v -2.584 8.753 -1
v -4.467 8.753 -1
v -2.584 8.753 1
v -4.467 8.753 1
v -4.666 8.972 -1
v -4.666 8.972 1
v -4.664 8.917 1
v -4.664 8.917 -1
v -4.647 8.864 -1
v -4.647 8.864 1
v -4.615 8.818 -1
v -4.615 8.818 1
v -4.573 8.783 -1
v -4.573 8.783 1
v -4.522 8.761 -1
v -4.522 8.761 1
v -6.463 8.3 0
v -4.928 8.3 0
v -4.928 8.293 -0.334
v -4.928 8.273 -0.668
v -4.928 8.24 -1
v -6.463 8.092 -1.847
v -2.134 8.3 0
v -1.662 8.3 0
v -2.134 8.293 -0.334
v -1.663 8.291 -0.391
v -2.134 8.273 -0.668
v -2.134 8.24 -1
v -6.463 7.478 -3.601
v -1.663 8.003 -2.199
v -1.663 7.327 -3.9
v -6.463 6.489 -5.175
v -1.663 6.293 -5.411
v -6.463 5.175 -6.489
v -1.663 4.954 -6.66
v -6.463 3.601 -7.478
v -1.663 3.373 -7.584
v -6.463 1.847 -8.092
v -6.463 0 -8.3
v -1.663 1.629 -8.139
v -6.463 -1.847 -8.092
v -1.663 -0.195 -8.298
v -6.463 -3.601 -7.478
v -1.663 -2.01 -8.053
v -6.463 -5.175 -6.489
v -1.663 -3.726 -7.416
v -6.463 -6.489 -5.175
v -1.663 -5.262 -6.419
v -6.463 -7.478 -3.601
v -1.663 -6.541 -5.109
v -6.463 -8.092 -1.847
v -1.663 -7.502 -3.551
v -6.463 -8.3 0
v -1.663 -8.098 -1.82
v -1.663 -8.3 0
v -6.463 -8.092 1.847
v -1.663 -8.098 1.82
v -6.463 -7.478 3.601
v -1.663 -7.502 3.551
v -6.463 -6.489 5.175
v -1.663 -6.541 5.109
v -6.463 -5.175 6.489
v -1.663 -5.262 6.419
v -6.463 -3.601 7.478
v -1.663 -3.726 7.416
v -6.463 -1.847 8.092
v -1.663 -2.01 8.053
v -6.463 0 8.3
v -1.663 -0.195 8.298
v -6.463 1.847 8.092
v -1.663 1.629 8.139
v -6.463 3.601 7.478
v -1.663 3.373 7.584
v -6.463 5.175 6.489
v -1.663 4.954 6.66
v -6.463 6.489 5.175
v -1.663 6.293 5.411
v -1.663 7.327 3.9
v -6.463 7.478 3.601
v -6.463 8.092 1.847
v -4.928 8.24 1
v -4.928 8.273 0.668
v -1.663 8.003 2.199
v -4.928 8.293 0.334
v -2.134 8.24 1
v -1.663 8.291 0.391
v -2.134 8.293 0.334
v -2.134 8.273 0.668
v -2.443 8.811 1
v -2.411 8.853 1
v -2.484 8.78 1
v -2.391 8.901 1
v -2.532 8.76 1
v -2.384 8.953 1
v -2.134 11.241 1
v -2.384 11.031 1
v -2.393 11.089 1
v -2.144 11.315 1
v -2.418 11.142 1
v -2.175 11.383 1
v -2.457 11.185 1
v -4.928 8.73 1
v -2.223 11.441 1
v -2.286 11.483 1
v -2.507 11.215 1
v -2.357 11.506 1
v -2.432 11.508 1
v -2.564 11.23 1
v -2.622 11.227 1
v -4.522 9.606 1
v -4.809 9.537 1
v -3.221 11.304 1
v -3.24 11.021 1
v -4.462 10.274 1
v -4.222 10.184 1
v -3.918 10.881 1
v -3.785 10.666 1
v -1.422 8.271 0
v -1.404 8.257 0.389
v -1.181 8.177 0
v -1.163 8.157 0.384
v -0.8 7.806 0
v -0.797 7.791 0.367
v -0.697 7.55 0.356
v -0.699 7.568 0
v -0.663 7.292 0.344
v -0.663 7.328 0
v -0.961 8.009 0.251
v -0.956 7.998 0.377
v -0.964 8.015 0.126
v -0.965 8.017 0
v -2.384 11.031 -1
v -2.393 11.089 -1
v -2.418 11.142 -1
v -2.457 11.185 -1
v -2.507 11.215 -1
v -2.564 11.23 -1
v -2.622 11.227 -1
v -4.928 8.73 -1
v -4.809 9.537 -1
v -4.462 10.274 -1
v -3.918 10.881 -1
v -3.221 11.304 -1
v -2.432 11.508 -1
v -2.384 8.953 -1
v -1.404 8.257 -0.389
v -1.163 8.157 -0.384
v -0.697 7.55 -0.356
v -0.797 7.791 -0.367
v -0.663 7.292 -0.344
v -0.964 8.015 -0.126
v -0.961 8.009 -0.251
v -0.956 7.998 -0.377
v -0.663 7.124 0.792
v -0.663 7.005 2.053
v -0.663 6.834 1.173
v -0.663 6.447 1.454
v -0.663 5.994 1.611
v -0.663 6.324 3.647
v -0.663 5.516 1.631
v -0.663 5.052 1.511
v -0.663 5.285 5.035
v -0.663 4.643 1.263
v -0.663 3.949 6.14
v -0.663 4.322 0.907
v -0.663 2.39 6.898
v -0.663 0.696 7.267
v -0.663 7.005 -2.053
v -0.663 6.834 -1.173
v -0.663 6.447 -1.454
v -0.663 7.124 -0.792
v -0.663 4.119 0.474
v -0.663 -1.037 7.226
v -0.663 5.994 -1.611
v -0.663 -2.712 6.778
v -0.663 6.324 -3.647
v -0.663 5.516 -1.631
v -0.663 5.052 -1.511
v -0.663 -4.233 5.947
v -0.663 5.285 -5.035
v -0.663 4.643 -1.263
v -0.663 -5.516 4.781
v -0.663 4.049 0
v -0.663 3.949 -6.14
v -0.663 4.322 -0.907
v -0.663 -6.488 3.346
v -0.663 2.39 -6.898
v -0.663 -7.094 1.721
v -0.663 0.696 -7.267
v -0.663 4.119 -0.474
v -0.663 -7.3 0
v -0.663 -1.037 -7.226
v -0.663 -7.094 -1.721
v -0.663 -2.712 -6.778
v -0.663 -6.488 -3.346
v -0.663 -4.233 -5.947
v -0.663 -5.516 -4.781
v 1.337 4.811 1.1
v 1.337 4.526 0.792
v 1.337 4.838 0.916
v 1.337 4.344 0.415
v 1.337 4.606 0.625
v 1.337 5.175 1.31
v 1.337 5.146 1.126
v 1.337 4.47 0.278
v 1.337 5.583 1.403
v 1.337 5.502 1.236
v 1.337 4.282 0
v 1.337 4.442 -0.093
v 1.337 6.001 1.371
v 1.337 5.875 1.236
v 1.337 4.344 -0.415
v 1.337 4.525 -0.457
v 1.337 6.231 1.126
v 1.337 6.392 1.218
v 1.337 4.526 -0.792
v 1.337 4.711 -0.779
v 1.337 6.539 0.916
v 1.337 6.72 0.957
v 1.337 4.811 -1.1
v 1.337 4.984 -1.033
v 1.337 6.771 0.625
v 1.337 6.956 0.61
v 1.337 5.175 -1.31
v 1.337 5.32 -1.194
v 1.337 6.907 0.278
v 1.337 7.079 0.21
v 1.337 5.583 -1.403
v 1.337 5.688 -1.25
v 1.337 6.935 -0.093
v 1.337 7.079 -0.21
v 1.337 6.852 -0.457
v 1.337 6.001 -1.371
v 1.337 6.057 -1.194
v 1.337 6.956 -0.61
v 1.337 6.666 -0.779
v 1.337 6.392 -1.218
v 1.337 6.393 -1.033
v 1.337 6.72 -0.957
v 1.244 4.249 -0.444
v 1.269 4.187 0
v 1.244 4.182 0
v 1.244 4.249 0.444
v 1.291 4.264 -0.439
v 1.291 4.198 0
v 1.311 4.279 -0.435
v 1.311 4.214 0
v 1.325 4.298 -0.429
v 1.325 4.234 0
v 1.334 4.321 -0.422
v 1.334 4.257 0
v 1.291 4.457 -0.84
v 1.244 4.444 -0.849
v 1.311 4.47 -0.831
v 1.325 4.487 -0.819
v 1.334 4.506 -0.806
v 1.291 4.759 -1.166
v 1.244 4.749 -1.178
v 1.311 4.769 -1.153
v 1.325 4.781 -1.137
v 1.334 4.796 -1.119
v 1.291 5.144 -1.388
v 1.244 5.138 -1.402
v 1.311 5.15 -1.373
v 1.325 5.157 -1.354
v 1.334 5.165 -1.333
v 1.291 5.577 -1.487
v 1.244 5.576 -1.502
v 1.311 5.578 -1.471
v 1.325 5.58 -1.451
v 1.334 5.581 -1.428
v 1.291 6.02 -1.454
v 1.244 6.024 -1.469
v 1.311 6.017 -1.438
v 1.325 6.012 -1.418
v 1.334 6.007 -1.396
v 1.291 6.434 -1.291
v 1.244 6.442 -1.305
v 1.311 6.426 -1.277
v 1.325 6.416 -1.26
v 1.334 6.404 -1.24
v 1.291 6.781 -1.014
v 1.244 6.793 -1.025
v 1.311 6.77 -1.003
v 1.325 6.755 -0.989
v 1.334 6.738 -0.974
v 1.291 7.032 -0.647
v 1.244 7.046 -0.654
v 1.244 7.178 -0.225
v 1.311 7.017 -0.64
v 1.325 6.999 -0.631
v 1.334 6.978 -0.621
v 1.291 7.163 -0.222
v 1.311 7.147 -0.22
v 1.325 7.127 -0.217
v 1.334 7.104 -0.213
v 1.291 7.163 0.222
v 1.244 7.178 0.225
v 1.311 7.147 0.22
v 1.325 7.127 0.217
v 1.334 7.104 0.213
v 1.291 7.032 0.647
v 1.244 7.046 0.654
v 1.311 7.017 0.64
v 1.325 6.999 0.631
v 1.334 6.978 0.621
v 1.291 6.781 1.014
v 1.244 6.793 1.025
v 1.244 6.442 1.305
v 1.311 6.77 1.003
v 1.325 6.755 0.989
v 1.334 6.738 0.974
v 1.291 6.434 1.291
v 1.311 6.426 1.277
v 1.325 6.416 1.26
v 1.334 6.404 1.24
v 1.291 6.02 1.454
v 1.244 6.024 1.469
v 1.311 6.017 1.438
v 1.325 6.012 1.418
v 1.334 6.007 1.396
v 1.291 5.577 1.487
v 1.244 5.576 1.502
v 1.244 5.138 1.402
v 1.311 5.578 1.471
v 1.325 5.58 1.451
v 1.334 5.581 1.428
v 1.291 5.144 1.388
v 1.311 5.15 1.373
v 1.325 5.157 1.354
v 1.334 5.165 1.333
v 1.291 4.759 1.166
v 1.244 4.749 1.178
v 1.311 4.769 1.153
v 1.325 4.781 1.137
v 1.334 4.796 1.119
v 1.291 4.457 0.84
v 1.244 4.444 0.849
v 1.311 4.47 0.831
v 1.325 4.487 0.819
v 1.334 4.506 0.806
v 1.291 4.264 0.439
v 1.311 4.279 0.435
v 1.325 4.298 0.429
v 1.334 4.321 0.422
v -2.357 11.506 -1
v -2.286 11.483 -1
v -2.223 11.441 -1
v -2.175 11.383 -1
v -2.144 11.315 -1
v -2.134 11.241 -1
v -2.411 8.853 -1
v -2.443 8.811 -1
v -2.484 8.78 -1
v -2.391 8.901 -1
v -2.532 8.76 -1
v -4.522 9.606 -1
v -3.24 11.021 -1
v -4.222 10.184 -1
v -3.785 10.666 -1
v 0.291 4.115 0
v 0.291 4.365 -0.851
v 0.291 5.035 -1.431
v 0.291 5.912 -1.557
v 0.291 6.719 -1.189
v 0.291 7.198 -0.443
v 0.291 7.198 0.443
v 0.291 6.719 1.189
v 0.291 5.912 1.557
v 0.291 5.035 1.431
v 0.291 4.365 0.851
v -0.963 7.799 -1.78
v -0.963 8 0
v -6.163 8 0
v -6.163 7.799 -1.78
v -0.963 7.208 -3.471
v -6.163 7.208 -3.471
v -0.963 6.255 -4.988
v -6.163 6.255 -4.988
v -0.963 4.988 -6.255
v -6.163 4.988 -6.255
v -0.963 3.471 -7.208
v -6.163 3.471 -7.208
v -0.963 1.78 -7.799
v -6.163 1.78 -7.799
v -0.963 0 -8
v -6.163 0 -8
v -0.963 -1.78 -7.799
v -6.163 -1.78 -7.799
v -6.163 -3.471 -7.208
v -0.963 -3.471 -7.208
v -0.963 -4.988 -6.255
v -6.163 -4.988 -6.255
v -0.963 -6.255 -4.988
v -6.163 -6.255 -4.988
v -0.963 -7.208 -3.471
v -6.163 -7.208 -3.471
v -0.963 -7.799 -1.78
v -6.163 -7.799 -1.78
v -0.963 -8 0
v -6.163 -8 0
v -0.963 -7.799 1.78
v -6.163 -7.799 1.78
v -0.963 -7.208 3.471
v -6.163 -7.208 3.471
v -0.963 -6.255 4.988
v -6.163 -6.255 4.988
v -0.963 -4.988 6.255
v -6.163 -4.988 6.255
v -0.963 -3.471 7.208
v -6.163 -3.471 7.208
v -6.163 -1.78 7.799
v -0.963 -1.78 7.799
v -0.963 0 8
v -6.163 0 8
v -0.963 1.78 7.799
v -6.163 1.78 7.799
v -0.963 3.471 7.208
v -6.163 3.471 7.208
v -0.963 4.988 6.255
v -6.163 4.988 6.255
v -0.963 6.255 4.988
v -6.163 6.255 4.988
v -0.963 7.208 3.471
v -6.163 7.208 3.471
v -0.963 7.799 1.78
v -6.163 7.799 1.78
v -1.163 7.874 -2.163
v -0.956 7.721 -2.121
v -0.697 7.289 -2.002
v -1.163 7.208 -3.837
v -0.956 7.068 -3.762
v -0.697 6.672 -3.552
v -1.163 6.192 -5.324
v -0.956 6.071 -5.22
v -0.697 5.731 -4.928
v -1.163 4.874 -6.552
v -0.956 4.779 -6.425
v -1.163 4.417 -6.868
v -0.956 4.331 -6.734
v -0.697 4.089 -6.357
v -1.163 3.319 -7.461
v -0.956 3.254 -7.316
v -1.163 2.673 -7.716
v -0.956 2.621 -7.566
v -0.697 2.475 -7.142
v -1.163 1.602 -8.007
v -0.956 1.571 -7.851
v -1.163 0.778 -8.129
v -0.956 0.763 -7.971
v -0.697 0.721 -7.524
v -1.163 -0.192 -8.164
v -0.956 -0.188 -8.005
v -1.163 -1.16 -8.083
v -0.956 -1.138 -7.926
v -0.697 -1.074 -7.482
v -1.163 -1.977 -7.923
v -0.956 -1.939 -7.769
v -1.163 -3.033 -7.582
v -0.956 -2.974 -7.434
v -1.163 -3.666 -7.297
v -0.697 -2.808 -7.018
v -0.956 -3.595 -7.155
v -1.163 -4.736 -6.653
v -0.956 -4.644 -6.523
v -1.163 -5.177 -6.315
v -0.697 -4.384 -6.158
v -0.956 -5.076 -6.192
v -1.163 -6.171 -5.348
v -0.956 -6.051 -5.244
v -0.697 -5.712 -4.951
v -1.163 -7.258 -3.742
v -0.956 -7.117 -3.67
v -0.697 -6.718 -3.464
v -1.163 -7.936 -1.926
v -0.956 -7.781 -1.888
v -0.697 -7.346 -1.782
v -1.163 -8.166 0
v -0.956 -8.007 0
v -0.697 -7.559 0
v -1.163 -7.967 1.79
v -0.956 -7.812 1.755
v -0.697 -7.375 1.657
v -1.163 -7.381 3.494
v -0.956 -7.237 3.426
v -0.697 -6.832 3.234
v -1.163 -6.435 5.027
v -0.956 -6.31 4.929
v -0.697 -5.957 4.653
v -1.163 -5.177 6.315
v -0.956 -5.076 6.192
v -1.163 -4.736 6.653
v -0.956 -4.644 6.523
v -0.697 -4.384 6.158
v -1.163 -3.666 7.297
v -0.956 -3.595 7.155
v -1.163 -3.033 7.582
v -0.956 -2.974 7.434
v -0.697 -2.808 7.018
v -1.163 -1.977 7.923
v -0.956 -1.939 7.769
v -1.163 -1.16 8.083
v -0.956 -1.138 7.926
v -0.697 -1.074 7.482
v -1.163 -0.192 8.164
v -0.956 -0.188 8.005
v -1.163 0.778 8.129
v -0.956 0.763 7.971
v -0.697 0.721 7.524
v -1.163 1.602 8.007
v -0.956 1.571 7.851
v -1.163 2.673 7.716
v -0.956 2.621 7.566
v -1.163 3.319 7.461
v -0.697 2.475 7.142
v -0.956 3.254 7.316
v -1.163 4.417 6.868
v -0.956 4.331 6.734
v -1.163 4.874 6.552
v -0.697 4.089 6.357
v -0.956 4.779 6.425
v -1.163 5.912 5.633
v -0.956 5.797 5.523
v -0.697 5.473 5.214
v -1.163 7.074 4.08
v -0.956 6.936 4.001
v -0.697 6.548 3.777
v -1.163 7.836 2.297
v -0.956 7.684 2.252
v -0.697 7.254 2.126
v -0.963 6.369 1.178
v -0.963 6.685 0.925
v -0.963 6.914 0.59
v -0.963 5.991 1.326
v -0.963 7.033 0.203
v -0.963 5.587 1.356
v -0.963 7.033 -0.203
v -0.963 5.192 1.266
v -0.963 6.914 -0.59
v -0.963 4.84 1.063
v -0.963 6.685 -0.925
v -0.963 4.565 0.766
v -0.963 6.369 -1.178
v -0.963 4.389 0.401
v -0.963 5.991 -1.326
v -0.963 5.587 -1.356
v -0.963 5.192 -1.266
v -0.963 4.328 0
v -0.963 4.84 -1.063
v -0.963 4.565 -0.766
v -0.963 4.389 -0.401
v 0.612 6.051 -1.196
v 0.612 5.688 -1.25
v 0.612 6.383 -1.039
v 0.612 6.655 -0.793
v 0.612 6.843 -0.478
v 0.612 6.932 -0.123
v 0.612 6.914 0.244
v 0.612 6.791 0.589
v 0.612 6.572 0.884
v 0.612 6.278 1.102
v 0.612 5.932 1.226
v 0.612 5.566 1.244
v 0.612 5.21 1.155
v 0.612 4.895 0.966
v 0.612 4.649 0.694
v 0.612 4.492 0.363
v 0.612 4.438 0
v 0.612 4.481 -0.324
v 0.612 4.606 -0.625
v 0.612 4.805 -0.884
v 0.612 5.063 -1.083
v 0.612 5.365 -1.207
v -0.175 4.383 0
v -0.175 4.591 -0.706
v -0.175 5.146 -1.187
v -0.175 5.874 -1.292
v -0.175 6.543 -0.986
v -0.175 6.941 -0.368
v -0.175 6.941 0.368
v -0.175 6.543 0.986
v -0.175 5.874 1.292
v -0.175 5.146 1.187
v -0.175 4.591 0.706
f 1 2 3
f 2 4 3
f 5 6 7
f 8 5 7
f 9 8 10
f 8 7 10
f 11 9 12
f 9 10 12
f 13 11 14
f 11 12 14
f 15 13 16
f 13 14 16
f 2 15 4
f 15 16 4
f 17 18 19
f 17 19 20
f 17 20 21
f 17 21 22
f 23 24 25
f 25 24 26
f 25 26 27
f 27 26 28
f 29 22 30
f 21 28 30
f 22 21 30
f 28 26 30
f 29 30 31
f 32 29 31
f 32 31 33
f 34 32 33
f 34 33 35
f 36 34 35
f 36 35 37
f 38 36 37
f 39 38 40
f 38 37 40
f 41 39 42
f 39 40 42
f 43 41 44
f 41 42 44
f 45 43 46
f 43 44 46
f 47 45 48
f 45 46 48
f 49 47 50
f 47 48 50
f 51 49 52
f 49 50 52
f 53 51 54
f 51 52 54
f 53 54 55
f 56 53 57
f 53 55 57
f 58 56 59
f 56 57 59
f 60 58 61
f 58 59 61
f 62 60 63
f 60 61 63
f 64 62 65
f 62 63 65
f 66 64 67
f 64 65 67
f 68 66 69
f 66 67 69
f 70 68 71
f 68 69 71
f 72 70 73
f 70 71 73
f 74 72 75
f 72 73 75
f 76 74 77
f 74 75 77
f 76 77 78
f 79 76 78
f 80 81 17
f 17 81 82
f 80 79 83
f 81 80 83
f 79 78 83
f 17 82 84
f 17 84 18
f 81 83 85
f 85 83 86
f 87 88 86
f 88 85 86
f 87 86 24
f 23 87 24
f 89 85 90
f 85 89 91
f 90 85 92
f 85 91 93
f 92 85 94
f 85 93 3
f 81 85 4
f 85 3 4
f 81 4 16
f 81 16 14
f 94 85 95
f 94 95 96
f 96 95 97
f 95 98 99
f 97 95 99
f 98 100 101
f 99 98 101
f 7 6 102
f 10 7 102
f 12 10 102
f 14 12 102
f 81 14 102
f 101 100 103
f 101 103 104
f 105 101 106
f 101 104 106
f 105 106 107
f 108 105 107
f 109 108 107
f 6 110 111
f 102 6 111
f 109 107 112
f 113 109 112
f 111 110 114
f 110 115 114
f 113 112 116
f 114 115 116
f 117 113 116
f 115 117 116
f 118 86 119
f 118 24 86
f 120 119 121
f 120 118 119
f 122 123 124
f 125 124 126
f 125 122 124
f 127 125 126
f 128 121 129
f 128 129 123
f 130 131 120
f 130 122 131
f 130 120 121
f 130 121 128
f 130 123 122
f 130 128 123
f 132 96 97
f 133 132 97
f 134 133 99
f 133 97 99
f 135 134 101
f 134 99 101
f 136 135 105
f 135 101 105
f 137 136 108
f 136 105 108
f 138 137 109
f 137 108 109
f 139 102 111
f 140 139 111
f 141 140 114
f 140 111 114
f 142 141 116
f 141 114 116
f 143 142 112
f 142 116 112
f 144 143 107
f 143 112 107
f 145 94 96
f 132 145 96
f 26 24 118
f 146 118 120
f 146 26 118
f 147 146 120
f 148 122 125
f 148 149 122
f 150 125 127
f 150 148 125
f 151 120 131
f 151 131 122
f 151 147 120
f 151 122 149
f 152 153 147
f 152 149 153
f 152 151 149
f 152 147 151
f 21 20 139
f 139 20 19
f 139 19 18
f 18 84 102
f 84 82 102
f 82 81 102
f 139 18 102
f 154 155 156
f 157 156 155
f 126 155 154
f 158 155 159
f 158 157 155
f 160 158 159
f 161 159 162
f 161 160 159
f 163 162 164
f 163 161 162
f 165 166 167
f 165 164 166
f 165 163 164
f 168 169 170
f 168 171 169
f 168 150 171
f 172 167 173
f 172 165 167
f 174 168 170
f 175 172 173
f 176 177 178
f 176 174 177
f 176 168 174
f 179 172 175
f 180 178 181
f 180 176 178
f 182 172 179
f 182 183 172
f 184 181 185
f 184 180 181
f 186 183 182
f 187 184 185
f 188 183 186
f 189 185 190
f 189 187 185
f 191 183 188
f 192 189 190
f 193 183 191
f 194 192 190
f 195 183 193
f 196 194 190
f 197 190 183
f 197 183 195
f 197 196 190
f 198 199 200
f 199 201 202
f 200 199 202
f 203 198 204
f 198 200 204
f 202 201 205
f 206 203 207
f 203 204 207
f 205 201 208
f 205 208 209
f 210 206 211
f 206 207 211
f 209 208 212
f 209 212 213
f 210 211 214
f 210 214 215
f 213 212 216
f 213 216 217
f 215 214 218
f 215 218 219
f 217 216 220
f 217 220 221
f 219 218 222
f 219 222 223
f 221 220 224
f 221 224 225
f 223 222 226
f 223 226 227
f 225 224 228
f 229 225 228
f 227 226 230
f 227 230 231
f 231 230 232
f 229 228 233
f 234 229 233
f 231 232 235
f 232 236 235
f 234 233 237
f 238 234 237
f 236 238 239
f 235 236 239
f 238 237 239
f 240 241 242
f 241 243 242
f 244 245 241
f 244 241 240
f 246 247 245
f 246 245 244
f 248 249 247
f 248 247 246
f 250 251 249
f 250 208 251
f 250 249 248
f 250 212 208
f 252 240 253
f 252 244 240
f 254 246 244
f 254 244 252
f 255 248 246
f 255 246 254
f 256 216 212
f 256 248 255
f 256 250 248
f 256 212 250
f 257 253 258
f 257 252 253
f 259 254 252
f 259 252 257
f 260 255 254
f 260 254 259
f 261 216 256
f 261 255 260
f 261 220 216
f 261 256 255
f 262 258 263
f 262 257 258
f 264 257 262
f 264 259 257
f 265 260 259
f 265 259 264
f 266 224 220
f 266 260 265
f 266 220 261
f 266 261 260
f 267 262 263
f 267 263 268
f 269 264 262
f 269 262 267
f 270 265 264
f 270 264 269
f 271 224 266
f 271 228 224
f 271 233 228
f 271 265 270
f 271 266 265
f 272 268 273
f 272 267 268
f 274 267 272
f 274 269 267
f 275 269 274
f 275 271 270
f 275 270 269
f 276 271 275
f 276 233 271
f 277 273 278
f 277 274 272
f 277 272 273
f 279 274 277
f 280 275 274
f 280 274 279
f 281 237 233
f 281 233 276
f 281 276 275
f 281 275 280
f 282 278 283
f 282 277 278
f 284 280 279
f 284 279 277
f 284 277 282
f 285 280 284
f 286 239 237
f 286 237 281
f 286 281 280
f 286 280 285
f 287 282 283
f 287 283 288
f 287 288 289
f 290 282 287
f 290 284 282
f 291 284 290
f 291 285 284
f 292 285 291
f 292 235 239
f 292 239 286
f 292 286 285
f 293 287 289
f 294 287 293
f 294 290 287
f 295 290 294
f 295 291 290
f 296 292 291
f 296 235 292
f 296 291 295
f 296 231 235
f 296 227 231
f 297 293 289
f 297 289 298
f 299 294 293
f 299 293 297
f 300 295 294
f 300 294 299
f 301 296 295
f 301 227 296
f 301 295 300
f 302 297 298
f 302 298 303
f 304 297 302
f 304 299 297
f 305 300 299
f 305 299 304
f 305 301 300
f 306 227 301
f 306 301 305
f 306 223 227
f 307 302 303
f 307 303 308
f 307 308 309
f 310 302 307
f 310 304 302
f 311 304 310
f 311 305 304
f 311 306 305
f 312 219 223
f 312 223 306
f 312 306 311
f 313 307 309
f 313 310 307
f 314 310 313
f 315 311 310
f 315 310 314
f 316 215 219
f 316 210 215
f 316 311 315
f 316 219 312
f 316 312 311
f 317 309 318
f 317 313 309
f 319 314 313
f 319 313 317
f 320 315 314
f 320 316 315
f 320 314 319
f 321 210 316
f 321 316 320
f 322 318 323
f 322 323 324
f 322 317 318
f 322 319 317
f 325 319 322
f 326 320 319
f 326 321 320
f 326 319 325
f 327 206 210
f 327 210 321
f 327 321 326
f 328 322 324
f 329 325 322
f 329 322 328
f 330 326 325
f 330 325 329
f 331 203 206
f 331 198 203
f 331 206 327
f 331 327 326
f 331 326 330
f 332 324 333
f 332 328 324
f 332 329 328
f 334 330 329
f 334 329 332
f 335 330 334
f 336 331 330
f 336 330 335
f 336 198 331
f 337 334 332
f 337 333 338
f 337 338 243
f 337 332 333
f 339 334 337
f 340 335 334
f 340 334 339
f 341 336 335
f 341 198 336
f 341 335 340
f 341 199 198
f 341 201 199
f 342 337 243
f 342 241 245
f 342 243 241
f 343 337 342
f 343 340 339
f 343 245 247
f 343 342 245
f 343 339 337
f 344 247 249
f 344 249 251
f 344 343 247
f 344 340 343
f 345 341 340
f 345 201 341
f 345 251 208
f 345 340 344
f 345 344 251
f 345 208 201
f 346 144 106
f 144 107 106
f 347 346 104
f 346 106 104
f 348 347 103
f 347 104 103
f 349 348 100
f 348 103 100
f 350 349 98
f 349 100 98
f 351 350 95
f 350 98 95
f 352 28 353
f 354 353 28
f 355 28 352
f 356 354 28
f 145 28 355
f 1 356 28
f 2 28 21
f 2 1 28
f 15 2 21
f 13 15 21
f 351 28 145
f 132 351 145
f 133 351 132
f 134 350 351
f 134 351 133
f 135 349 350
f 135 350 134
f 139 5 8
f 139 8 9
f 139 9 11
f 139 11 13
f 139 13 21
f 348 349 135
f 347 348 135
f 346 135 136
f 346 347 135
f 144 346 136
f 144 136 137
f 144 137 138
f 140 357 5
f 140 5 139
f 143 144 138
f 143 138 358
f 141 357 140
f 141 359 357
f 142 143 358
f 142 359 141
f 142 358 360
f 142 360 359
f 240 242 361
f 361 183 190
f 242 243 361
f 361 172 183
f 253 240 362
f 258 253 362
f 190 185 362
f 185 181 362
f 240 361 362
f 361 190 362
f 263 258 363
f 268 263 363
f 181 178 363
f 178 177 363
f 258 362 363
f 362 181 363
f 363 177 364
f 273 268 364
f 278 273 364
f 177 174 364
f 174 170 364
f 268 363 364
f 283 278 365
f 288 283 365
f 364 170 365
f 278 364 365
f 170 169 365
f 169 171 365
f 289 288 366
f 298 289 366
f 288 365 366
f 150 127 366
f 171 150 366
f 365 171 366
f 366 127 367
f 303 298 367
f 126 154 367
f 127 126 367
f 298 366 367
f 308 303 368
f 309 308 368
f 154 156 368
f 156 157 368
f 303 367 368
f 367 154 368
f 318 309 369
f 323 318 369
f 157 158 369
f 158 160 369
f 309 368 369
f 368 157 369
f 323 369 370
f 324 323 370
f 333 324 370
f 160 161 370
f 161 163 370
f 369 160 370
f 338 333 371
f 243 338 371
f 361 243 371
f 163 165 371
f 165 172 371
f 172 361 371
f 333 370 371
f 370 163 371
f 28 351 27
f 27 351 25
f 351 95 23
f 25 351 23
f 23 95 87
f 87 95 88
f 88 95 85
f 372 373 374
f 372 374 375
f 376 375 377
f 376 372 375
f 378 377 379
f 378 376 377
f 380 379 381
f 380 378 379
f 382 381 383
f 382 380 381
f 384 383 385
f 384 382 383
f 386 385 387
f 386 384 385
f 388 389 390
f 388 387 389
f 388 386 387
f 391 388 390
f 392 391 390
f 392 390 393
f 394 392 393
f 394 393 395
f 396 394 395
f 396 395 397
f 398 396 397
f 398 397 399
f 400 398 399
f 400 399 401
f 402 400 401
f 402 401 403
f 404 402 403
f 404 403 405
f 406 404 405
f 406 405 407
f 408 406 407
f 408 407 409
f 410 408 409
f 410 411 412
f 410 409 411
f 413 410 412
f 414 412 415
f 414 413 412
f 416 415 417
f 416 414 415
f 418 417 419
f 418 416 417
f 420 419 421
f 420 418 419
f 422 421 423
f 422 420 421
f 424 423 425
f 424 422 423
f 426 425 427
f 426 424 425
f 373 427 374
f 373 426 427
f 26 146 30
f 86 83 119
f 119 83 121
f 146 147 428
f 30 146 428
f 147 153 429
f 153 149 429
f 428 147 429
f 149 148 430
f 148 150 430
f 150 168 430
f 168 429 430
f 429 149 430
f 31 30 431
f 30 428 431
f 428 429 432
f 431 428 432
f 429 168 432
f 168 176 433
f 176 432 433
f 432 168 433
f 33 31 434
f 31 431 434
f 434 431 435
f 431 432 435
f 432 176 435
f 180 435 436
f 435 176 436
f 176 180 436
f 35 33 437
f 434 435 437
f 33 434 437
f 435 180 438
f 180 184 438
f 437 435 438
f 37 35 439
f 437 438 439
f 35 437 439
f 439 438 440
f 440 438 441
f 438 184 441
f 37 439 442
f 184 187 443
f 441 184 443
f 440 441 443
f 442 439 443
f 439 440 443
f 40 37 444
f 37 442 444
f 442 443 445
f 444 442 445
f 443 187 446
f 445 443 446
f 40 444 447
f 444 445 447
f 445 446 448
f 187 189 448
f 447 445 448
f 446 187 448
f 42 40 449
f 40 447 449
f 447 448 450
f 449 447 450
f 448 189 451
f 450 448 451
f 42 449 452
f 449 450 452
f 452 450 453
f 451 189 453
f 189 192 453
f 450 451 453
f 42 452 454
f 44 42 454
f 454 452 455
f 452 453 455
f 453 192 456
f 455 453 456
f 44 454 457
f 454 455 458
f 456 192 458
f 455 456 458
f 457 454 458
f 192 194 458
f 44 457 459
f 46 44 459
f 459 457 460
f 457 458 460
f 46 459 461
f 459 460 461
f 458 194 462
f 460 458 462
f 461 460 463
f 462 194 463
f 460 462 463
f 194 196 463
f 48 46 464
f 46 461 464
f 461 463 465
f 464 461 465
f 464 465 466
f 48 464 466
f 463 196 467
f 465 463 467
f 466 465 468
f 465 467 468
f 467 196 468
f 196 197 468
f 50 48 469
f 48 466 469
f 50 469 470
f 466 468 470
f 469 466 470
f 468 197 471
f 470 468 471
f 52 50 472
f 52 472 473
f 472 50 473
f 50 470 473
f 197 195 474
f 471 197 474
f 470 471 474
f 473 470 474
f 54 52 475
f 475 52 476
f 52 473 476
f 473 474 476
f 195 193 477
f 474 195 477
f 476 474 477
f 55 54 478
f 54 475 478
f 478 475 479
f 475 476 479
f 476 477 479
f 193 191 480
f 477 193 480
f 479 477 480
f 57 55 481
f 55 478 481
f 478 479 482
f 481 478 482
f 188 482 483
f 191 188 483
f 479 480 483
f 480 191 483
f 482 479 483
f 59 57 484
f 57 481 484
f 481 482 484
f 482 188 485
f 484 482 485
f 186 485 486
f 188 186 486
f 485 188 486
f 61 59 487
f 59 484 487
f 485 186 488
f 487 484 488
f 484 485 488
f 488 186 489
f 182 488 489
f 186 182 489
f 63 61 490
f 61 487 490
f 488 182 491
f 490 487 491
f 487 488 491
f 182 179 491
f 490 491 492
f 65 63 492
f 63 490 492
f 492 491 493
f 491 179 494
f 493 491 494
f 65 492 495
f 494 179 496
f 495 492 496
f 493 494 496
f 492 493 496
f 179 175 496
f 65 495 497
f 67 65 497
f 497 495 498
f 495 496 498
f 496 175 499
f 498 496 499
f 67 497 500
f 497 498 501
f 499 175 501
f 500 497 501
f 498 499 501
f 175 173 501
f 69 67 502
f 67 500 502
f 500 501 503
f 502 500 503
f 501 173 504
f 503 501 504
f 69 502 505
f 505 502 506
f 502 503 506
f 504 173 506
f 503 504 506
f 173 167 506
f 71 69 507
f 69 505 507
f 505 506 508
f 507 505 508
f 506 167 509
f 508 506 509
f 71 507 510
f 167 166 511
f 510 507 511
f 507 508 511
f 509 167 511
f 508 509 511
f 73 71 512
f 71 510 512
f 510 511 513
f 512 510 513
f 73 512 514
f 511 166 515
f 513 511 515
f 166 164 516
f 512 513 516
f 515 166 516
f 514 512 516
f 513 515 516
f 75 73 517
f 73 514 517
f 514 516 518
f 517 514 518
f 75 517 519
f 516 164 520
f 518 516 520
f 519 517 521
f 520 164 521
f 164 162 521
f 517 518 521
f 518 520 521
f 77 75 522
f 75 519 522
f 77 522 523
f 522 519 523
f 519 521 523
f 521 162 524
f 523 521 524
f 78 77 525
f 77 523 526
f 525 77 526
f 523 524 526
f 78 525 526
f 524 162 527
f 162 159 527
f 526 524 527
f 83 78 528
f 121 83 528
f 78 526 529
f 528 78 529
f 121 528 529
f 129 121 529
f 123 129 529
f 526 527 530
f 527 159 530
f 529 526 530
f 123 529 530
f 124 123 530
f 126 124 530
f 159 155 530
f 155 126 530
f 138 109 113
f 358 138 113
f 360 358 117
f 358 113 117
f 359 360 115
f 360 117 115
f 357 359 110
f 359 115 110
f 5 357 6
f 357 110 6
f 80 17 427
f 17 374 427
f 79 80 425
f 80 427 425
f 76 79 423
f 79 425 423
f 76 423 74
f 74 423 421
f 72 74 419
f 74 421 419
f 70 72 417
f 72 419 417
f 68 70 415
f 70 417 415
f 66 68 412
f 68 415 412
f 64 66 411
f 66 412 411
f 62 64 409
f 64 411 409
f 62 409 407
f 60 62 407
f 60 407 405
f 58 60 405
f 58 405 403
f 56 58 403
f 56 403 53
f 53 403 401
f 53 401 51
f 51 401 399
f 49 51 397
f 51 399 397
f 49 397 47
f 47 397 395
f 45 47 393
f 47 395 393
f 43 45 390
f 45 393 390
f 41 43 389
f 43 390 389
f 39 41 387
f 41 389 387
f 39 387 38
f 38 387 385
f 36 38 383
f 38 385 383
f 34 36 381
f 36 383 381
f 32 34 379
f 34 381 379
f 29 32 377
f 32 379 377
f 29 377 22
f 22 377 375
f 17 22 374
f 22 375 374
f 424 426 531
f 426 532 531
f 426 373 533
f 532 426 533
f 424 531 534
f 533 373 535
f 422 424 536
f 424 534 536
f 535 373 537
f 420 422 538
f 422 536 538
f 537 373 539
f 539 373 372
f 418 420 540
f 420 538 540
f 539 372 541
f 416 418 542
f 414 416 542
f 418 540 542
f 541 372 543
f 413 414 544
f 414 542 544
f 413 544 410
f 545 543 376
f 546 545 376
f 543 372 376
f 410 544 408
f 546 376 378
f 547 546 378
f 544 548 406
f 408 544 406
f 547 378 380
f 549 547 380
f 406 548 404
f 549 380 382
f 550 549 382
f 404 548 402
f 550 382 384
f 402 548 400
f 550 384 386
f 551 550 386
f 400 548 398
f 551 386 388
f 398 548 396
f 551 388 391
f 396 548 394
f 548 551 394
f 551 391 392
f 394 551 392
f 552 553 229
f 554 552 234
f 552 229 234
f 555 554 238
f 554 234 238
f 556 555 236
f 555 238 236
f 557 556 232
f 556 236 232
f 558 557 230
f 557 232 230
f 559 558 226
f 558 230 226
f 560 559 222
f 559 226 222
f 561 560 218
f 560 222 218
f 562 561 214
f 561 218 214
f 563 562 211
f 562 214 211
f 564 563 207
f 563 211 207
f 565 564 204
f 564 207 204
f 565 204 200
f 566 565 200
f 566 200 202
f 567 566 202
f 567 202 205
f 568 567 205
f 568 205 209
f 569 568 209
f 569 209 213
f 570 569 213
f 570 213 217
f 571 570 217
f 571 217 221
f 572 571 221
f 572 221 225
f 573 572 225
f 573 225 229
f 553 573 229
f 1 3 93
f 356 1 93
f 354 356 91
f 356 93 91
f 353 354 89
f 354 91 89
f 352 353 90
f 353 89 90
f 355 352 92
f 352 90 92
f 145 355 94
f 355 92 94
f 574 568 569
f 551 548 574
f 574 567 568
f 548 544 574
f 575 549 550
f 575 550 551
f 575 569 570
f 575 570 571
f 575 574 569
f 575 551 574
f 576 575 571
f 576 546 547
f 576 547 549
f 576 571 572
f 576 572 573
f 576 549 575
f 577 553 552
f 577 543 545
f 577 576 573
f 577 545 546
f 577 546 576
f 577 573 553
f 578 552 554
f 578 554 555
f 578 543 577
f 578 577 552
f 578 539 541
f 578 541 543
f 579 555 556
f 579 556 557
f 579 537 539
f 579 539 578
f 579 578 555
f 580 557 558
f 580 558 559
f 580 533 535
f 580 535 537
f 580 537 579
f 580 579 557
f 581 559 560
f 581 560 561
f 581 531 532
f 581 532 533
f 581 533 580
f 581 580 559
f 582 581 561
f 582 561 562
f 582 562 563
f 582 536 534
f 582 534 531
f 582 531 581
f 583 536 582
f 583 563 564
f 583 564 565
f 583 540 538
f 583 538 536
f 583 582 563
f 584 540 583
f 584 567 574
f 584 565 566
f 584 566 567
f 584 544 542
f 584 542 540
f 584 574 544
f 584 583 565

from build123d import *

# Parameters (mm, degrees)
SKETCH2_W           = 6
SKETCH2_H           = 8.3
SHELL1_T            = -0.3
SKETCH5_R           = 1.25
CUT_EXTRUDE1_DEPTH  = 10
FILLET1_R           = 1
FILLET2_R           = 0.1
CHAMFER1_SIZE       = 0.5
BOSS_EXTRUDE1_DEPTH = 1


with BuildPart() as part:
    # Sketch2 → Revolve1 (revolve)
    with BuildSketch(Plane.XY):
        with Locations((-3.662621359, 4.15)):
            Rectangle(SKETCH2_W, SKETCH2_H)
    revolve(axis=Axis((0, 0, 0), (-1, 0, 0)))

    # Sketch3 → Revolve2 (revolve)
    with BuildSketch(Plane.XY, mode=Mode.PRIVATE) as revolve2_sk:
        Polygon((1.337378641, 7.188452486), (-0.662621359, 7.328306109), (-0.662621359, 5.688452486), (1.337378641, 5.688452486), align=None)
    revolve(revolve2_sk.sketch.rotate(Axis((-0.662621359, 5.688452486, 0), (1, 0, 0)), 180), axis=Axis((-0.662621359, 5.688452486, 0), (1, 0, 0)))

    # Shell1
    shell1_openings = [part.faces().sort_by_distance(p)[0] for p in [
        (-6.662621359, 0, 0),
    ]]
    offset(amount=SHELL1_T, openings=shell1_openings, kind=Kind.INTERSECTION)

    # Sketch5 → Cut-Extrude1 (cut)
    with BuildSketch(Plane(origin=(1.337378641, 0, 0), x_dir=(0, 0, -1), z_dir=(1, 0, 0))):
        with Locations((0, 5.688452486)):
            Circle(SKETCH5_R)
    extrude(amount=-CUT_EXTRUDE1_DEPTH, mode=Mode.SUBTRACT)

    # Fillet1
    fillet1_edges = [part.edges().sort_by_distance(p)[0] for p in [
        (-0.662621359, -8.3, 0),
    ]]
    fillet(fillet1_edges, radius=FILLET1_R)

    # Fillet2
    fillet2_edges = [part.edges().sort_by_distance(p)[0] for p in [
        (1.337378641, 7.188452486, 0),
    ]]
    fillet(fillet2_edges, radius=FILLET2_R)

    # Chamfer1
    # the kernel refuses this chamfer: 0.5 mm, written as the material it takes off along each edge
    with BuildSketch(Plane(origin=(-6.662621359, 0, 0), x_dir=(0, 1, 0), z_dir=(0, 0, -1))) as chamfer1_piece_1:
        Polygon((8 + CHAMFER1_SIZE, 0), (8, CHAMFER1_SIZE), (8, 0), align=None)
    revolve(axis=Axis((-6.662621359, 0, 0), (1, 0, 0)), mode=Mode.SUBTRACT)

    # Sketch6 → Boss-Extrude1 (add, symmetric)
    with BuildSketch(Plane.XY):
        with BuildLine():
            Line((-4.927907027, 8.3), (-4.927907027, 8.730333701))
            ThreePointArc((-4.927907027, 8.730333701), (-4.212236683, 10.597628426), (-2.431874659, 11.508279126))
            ThreePointArc((-2.431874659, 11.508279126), (-2.223300905, 11.440869947), (-2.134041341, 11.2406707))
            Line((-2.134041341, 11.2406707), (-2.134041341, 8.115869894))
            Line((-2.134041341, 8.115869894), (-4.927907027, 8.115869894))
            Line((-4.927907027, 8.115869894), (-4.927907027, 7.714440325))
            Line((-4.927907027, 7.714440325), (-4.927907027, 8.3))
        make_face()
        with BuildLine():
            Line((-4.467319737, 8.752860733), (-2.584041341, 8.752860733))
            ThreePointArc((-2.584041341, 8.752860733), (-2.442619985, 8.811439376), (-2.384041341, 8.952860733))
            Line((-2.384041341, 8.952860733), (-2.384041341, 11.030595936))
            ThreePointArc((-2.384041341, 11.030595936), (-2.456918607, 11.184997395), (-2.622439446, 11.226875292))
            ThreePointArc((-2.622439446, 11.226875292), (-4.018863264, 10.438753715), (-4.666416333, 8.971848769))
            ThreePointArc((-4.666416333, 8.971848769), (-4.61530218, 8.818320046), (-4.467319737, 8.752860733))
        make_face(mode=Mode.SUBTRACT)
    extrude(amount=BOSS_EXTRUDE1_DEPTH, both=True)


solid = part.part
